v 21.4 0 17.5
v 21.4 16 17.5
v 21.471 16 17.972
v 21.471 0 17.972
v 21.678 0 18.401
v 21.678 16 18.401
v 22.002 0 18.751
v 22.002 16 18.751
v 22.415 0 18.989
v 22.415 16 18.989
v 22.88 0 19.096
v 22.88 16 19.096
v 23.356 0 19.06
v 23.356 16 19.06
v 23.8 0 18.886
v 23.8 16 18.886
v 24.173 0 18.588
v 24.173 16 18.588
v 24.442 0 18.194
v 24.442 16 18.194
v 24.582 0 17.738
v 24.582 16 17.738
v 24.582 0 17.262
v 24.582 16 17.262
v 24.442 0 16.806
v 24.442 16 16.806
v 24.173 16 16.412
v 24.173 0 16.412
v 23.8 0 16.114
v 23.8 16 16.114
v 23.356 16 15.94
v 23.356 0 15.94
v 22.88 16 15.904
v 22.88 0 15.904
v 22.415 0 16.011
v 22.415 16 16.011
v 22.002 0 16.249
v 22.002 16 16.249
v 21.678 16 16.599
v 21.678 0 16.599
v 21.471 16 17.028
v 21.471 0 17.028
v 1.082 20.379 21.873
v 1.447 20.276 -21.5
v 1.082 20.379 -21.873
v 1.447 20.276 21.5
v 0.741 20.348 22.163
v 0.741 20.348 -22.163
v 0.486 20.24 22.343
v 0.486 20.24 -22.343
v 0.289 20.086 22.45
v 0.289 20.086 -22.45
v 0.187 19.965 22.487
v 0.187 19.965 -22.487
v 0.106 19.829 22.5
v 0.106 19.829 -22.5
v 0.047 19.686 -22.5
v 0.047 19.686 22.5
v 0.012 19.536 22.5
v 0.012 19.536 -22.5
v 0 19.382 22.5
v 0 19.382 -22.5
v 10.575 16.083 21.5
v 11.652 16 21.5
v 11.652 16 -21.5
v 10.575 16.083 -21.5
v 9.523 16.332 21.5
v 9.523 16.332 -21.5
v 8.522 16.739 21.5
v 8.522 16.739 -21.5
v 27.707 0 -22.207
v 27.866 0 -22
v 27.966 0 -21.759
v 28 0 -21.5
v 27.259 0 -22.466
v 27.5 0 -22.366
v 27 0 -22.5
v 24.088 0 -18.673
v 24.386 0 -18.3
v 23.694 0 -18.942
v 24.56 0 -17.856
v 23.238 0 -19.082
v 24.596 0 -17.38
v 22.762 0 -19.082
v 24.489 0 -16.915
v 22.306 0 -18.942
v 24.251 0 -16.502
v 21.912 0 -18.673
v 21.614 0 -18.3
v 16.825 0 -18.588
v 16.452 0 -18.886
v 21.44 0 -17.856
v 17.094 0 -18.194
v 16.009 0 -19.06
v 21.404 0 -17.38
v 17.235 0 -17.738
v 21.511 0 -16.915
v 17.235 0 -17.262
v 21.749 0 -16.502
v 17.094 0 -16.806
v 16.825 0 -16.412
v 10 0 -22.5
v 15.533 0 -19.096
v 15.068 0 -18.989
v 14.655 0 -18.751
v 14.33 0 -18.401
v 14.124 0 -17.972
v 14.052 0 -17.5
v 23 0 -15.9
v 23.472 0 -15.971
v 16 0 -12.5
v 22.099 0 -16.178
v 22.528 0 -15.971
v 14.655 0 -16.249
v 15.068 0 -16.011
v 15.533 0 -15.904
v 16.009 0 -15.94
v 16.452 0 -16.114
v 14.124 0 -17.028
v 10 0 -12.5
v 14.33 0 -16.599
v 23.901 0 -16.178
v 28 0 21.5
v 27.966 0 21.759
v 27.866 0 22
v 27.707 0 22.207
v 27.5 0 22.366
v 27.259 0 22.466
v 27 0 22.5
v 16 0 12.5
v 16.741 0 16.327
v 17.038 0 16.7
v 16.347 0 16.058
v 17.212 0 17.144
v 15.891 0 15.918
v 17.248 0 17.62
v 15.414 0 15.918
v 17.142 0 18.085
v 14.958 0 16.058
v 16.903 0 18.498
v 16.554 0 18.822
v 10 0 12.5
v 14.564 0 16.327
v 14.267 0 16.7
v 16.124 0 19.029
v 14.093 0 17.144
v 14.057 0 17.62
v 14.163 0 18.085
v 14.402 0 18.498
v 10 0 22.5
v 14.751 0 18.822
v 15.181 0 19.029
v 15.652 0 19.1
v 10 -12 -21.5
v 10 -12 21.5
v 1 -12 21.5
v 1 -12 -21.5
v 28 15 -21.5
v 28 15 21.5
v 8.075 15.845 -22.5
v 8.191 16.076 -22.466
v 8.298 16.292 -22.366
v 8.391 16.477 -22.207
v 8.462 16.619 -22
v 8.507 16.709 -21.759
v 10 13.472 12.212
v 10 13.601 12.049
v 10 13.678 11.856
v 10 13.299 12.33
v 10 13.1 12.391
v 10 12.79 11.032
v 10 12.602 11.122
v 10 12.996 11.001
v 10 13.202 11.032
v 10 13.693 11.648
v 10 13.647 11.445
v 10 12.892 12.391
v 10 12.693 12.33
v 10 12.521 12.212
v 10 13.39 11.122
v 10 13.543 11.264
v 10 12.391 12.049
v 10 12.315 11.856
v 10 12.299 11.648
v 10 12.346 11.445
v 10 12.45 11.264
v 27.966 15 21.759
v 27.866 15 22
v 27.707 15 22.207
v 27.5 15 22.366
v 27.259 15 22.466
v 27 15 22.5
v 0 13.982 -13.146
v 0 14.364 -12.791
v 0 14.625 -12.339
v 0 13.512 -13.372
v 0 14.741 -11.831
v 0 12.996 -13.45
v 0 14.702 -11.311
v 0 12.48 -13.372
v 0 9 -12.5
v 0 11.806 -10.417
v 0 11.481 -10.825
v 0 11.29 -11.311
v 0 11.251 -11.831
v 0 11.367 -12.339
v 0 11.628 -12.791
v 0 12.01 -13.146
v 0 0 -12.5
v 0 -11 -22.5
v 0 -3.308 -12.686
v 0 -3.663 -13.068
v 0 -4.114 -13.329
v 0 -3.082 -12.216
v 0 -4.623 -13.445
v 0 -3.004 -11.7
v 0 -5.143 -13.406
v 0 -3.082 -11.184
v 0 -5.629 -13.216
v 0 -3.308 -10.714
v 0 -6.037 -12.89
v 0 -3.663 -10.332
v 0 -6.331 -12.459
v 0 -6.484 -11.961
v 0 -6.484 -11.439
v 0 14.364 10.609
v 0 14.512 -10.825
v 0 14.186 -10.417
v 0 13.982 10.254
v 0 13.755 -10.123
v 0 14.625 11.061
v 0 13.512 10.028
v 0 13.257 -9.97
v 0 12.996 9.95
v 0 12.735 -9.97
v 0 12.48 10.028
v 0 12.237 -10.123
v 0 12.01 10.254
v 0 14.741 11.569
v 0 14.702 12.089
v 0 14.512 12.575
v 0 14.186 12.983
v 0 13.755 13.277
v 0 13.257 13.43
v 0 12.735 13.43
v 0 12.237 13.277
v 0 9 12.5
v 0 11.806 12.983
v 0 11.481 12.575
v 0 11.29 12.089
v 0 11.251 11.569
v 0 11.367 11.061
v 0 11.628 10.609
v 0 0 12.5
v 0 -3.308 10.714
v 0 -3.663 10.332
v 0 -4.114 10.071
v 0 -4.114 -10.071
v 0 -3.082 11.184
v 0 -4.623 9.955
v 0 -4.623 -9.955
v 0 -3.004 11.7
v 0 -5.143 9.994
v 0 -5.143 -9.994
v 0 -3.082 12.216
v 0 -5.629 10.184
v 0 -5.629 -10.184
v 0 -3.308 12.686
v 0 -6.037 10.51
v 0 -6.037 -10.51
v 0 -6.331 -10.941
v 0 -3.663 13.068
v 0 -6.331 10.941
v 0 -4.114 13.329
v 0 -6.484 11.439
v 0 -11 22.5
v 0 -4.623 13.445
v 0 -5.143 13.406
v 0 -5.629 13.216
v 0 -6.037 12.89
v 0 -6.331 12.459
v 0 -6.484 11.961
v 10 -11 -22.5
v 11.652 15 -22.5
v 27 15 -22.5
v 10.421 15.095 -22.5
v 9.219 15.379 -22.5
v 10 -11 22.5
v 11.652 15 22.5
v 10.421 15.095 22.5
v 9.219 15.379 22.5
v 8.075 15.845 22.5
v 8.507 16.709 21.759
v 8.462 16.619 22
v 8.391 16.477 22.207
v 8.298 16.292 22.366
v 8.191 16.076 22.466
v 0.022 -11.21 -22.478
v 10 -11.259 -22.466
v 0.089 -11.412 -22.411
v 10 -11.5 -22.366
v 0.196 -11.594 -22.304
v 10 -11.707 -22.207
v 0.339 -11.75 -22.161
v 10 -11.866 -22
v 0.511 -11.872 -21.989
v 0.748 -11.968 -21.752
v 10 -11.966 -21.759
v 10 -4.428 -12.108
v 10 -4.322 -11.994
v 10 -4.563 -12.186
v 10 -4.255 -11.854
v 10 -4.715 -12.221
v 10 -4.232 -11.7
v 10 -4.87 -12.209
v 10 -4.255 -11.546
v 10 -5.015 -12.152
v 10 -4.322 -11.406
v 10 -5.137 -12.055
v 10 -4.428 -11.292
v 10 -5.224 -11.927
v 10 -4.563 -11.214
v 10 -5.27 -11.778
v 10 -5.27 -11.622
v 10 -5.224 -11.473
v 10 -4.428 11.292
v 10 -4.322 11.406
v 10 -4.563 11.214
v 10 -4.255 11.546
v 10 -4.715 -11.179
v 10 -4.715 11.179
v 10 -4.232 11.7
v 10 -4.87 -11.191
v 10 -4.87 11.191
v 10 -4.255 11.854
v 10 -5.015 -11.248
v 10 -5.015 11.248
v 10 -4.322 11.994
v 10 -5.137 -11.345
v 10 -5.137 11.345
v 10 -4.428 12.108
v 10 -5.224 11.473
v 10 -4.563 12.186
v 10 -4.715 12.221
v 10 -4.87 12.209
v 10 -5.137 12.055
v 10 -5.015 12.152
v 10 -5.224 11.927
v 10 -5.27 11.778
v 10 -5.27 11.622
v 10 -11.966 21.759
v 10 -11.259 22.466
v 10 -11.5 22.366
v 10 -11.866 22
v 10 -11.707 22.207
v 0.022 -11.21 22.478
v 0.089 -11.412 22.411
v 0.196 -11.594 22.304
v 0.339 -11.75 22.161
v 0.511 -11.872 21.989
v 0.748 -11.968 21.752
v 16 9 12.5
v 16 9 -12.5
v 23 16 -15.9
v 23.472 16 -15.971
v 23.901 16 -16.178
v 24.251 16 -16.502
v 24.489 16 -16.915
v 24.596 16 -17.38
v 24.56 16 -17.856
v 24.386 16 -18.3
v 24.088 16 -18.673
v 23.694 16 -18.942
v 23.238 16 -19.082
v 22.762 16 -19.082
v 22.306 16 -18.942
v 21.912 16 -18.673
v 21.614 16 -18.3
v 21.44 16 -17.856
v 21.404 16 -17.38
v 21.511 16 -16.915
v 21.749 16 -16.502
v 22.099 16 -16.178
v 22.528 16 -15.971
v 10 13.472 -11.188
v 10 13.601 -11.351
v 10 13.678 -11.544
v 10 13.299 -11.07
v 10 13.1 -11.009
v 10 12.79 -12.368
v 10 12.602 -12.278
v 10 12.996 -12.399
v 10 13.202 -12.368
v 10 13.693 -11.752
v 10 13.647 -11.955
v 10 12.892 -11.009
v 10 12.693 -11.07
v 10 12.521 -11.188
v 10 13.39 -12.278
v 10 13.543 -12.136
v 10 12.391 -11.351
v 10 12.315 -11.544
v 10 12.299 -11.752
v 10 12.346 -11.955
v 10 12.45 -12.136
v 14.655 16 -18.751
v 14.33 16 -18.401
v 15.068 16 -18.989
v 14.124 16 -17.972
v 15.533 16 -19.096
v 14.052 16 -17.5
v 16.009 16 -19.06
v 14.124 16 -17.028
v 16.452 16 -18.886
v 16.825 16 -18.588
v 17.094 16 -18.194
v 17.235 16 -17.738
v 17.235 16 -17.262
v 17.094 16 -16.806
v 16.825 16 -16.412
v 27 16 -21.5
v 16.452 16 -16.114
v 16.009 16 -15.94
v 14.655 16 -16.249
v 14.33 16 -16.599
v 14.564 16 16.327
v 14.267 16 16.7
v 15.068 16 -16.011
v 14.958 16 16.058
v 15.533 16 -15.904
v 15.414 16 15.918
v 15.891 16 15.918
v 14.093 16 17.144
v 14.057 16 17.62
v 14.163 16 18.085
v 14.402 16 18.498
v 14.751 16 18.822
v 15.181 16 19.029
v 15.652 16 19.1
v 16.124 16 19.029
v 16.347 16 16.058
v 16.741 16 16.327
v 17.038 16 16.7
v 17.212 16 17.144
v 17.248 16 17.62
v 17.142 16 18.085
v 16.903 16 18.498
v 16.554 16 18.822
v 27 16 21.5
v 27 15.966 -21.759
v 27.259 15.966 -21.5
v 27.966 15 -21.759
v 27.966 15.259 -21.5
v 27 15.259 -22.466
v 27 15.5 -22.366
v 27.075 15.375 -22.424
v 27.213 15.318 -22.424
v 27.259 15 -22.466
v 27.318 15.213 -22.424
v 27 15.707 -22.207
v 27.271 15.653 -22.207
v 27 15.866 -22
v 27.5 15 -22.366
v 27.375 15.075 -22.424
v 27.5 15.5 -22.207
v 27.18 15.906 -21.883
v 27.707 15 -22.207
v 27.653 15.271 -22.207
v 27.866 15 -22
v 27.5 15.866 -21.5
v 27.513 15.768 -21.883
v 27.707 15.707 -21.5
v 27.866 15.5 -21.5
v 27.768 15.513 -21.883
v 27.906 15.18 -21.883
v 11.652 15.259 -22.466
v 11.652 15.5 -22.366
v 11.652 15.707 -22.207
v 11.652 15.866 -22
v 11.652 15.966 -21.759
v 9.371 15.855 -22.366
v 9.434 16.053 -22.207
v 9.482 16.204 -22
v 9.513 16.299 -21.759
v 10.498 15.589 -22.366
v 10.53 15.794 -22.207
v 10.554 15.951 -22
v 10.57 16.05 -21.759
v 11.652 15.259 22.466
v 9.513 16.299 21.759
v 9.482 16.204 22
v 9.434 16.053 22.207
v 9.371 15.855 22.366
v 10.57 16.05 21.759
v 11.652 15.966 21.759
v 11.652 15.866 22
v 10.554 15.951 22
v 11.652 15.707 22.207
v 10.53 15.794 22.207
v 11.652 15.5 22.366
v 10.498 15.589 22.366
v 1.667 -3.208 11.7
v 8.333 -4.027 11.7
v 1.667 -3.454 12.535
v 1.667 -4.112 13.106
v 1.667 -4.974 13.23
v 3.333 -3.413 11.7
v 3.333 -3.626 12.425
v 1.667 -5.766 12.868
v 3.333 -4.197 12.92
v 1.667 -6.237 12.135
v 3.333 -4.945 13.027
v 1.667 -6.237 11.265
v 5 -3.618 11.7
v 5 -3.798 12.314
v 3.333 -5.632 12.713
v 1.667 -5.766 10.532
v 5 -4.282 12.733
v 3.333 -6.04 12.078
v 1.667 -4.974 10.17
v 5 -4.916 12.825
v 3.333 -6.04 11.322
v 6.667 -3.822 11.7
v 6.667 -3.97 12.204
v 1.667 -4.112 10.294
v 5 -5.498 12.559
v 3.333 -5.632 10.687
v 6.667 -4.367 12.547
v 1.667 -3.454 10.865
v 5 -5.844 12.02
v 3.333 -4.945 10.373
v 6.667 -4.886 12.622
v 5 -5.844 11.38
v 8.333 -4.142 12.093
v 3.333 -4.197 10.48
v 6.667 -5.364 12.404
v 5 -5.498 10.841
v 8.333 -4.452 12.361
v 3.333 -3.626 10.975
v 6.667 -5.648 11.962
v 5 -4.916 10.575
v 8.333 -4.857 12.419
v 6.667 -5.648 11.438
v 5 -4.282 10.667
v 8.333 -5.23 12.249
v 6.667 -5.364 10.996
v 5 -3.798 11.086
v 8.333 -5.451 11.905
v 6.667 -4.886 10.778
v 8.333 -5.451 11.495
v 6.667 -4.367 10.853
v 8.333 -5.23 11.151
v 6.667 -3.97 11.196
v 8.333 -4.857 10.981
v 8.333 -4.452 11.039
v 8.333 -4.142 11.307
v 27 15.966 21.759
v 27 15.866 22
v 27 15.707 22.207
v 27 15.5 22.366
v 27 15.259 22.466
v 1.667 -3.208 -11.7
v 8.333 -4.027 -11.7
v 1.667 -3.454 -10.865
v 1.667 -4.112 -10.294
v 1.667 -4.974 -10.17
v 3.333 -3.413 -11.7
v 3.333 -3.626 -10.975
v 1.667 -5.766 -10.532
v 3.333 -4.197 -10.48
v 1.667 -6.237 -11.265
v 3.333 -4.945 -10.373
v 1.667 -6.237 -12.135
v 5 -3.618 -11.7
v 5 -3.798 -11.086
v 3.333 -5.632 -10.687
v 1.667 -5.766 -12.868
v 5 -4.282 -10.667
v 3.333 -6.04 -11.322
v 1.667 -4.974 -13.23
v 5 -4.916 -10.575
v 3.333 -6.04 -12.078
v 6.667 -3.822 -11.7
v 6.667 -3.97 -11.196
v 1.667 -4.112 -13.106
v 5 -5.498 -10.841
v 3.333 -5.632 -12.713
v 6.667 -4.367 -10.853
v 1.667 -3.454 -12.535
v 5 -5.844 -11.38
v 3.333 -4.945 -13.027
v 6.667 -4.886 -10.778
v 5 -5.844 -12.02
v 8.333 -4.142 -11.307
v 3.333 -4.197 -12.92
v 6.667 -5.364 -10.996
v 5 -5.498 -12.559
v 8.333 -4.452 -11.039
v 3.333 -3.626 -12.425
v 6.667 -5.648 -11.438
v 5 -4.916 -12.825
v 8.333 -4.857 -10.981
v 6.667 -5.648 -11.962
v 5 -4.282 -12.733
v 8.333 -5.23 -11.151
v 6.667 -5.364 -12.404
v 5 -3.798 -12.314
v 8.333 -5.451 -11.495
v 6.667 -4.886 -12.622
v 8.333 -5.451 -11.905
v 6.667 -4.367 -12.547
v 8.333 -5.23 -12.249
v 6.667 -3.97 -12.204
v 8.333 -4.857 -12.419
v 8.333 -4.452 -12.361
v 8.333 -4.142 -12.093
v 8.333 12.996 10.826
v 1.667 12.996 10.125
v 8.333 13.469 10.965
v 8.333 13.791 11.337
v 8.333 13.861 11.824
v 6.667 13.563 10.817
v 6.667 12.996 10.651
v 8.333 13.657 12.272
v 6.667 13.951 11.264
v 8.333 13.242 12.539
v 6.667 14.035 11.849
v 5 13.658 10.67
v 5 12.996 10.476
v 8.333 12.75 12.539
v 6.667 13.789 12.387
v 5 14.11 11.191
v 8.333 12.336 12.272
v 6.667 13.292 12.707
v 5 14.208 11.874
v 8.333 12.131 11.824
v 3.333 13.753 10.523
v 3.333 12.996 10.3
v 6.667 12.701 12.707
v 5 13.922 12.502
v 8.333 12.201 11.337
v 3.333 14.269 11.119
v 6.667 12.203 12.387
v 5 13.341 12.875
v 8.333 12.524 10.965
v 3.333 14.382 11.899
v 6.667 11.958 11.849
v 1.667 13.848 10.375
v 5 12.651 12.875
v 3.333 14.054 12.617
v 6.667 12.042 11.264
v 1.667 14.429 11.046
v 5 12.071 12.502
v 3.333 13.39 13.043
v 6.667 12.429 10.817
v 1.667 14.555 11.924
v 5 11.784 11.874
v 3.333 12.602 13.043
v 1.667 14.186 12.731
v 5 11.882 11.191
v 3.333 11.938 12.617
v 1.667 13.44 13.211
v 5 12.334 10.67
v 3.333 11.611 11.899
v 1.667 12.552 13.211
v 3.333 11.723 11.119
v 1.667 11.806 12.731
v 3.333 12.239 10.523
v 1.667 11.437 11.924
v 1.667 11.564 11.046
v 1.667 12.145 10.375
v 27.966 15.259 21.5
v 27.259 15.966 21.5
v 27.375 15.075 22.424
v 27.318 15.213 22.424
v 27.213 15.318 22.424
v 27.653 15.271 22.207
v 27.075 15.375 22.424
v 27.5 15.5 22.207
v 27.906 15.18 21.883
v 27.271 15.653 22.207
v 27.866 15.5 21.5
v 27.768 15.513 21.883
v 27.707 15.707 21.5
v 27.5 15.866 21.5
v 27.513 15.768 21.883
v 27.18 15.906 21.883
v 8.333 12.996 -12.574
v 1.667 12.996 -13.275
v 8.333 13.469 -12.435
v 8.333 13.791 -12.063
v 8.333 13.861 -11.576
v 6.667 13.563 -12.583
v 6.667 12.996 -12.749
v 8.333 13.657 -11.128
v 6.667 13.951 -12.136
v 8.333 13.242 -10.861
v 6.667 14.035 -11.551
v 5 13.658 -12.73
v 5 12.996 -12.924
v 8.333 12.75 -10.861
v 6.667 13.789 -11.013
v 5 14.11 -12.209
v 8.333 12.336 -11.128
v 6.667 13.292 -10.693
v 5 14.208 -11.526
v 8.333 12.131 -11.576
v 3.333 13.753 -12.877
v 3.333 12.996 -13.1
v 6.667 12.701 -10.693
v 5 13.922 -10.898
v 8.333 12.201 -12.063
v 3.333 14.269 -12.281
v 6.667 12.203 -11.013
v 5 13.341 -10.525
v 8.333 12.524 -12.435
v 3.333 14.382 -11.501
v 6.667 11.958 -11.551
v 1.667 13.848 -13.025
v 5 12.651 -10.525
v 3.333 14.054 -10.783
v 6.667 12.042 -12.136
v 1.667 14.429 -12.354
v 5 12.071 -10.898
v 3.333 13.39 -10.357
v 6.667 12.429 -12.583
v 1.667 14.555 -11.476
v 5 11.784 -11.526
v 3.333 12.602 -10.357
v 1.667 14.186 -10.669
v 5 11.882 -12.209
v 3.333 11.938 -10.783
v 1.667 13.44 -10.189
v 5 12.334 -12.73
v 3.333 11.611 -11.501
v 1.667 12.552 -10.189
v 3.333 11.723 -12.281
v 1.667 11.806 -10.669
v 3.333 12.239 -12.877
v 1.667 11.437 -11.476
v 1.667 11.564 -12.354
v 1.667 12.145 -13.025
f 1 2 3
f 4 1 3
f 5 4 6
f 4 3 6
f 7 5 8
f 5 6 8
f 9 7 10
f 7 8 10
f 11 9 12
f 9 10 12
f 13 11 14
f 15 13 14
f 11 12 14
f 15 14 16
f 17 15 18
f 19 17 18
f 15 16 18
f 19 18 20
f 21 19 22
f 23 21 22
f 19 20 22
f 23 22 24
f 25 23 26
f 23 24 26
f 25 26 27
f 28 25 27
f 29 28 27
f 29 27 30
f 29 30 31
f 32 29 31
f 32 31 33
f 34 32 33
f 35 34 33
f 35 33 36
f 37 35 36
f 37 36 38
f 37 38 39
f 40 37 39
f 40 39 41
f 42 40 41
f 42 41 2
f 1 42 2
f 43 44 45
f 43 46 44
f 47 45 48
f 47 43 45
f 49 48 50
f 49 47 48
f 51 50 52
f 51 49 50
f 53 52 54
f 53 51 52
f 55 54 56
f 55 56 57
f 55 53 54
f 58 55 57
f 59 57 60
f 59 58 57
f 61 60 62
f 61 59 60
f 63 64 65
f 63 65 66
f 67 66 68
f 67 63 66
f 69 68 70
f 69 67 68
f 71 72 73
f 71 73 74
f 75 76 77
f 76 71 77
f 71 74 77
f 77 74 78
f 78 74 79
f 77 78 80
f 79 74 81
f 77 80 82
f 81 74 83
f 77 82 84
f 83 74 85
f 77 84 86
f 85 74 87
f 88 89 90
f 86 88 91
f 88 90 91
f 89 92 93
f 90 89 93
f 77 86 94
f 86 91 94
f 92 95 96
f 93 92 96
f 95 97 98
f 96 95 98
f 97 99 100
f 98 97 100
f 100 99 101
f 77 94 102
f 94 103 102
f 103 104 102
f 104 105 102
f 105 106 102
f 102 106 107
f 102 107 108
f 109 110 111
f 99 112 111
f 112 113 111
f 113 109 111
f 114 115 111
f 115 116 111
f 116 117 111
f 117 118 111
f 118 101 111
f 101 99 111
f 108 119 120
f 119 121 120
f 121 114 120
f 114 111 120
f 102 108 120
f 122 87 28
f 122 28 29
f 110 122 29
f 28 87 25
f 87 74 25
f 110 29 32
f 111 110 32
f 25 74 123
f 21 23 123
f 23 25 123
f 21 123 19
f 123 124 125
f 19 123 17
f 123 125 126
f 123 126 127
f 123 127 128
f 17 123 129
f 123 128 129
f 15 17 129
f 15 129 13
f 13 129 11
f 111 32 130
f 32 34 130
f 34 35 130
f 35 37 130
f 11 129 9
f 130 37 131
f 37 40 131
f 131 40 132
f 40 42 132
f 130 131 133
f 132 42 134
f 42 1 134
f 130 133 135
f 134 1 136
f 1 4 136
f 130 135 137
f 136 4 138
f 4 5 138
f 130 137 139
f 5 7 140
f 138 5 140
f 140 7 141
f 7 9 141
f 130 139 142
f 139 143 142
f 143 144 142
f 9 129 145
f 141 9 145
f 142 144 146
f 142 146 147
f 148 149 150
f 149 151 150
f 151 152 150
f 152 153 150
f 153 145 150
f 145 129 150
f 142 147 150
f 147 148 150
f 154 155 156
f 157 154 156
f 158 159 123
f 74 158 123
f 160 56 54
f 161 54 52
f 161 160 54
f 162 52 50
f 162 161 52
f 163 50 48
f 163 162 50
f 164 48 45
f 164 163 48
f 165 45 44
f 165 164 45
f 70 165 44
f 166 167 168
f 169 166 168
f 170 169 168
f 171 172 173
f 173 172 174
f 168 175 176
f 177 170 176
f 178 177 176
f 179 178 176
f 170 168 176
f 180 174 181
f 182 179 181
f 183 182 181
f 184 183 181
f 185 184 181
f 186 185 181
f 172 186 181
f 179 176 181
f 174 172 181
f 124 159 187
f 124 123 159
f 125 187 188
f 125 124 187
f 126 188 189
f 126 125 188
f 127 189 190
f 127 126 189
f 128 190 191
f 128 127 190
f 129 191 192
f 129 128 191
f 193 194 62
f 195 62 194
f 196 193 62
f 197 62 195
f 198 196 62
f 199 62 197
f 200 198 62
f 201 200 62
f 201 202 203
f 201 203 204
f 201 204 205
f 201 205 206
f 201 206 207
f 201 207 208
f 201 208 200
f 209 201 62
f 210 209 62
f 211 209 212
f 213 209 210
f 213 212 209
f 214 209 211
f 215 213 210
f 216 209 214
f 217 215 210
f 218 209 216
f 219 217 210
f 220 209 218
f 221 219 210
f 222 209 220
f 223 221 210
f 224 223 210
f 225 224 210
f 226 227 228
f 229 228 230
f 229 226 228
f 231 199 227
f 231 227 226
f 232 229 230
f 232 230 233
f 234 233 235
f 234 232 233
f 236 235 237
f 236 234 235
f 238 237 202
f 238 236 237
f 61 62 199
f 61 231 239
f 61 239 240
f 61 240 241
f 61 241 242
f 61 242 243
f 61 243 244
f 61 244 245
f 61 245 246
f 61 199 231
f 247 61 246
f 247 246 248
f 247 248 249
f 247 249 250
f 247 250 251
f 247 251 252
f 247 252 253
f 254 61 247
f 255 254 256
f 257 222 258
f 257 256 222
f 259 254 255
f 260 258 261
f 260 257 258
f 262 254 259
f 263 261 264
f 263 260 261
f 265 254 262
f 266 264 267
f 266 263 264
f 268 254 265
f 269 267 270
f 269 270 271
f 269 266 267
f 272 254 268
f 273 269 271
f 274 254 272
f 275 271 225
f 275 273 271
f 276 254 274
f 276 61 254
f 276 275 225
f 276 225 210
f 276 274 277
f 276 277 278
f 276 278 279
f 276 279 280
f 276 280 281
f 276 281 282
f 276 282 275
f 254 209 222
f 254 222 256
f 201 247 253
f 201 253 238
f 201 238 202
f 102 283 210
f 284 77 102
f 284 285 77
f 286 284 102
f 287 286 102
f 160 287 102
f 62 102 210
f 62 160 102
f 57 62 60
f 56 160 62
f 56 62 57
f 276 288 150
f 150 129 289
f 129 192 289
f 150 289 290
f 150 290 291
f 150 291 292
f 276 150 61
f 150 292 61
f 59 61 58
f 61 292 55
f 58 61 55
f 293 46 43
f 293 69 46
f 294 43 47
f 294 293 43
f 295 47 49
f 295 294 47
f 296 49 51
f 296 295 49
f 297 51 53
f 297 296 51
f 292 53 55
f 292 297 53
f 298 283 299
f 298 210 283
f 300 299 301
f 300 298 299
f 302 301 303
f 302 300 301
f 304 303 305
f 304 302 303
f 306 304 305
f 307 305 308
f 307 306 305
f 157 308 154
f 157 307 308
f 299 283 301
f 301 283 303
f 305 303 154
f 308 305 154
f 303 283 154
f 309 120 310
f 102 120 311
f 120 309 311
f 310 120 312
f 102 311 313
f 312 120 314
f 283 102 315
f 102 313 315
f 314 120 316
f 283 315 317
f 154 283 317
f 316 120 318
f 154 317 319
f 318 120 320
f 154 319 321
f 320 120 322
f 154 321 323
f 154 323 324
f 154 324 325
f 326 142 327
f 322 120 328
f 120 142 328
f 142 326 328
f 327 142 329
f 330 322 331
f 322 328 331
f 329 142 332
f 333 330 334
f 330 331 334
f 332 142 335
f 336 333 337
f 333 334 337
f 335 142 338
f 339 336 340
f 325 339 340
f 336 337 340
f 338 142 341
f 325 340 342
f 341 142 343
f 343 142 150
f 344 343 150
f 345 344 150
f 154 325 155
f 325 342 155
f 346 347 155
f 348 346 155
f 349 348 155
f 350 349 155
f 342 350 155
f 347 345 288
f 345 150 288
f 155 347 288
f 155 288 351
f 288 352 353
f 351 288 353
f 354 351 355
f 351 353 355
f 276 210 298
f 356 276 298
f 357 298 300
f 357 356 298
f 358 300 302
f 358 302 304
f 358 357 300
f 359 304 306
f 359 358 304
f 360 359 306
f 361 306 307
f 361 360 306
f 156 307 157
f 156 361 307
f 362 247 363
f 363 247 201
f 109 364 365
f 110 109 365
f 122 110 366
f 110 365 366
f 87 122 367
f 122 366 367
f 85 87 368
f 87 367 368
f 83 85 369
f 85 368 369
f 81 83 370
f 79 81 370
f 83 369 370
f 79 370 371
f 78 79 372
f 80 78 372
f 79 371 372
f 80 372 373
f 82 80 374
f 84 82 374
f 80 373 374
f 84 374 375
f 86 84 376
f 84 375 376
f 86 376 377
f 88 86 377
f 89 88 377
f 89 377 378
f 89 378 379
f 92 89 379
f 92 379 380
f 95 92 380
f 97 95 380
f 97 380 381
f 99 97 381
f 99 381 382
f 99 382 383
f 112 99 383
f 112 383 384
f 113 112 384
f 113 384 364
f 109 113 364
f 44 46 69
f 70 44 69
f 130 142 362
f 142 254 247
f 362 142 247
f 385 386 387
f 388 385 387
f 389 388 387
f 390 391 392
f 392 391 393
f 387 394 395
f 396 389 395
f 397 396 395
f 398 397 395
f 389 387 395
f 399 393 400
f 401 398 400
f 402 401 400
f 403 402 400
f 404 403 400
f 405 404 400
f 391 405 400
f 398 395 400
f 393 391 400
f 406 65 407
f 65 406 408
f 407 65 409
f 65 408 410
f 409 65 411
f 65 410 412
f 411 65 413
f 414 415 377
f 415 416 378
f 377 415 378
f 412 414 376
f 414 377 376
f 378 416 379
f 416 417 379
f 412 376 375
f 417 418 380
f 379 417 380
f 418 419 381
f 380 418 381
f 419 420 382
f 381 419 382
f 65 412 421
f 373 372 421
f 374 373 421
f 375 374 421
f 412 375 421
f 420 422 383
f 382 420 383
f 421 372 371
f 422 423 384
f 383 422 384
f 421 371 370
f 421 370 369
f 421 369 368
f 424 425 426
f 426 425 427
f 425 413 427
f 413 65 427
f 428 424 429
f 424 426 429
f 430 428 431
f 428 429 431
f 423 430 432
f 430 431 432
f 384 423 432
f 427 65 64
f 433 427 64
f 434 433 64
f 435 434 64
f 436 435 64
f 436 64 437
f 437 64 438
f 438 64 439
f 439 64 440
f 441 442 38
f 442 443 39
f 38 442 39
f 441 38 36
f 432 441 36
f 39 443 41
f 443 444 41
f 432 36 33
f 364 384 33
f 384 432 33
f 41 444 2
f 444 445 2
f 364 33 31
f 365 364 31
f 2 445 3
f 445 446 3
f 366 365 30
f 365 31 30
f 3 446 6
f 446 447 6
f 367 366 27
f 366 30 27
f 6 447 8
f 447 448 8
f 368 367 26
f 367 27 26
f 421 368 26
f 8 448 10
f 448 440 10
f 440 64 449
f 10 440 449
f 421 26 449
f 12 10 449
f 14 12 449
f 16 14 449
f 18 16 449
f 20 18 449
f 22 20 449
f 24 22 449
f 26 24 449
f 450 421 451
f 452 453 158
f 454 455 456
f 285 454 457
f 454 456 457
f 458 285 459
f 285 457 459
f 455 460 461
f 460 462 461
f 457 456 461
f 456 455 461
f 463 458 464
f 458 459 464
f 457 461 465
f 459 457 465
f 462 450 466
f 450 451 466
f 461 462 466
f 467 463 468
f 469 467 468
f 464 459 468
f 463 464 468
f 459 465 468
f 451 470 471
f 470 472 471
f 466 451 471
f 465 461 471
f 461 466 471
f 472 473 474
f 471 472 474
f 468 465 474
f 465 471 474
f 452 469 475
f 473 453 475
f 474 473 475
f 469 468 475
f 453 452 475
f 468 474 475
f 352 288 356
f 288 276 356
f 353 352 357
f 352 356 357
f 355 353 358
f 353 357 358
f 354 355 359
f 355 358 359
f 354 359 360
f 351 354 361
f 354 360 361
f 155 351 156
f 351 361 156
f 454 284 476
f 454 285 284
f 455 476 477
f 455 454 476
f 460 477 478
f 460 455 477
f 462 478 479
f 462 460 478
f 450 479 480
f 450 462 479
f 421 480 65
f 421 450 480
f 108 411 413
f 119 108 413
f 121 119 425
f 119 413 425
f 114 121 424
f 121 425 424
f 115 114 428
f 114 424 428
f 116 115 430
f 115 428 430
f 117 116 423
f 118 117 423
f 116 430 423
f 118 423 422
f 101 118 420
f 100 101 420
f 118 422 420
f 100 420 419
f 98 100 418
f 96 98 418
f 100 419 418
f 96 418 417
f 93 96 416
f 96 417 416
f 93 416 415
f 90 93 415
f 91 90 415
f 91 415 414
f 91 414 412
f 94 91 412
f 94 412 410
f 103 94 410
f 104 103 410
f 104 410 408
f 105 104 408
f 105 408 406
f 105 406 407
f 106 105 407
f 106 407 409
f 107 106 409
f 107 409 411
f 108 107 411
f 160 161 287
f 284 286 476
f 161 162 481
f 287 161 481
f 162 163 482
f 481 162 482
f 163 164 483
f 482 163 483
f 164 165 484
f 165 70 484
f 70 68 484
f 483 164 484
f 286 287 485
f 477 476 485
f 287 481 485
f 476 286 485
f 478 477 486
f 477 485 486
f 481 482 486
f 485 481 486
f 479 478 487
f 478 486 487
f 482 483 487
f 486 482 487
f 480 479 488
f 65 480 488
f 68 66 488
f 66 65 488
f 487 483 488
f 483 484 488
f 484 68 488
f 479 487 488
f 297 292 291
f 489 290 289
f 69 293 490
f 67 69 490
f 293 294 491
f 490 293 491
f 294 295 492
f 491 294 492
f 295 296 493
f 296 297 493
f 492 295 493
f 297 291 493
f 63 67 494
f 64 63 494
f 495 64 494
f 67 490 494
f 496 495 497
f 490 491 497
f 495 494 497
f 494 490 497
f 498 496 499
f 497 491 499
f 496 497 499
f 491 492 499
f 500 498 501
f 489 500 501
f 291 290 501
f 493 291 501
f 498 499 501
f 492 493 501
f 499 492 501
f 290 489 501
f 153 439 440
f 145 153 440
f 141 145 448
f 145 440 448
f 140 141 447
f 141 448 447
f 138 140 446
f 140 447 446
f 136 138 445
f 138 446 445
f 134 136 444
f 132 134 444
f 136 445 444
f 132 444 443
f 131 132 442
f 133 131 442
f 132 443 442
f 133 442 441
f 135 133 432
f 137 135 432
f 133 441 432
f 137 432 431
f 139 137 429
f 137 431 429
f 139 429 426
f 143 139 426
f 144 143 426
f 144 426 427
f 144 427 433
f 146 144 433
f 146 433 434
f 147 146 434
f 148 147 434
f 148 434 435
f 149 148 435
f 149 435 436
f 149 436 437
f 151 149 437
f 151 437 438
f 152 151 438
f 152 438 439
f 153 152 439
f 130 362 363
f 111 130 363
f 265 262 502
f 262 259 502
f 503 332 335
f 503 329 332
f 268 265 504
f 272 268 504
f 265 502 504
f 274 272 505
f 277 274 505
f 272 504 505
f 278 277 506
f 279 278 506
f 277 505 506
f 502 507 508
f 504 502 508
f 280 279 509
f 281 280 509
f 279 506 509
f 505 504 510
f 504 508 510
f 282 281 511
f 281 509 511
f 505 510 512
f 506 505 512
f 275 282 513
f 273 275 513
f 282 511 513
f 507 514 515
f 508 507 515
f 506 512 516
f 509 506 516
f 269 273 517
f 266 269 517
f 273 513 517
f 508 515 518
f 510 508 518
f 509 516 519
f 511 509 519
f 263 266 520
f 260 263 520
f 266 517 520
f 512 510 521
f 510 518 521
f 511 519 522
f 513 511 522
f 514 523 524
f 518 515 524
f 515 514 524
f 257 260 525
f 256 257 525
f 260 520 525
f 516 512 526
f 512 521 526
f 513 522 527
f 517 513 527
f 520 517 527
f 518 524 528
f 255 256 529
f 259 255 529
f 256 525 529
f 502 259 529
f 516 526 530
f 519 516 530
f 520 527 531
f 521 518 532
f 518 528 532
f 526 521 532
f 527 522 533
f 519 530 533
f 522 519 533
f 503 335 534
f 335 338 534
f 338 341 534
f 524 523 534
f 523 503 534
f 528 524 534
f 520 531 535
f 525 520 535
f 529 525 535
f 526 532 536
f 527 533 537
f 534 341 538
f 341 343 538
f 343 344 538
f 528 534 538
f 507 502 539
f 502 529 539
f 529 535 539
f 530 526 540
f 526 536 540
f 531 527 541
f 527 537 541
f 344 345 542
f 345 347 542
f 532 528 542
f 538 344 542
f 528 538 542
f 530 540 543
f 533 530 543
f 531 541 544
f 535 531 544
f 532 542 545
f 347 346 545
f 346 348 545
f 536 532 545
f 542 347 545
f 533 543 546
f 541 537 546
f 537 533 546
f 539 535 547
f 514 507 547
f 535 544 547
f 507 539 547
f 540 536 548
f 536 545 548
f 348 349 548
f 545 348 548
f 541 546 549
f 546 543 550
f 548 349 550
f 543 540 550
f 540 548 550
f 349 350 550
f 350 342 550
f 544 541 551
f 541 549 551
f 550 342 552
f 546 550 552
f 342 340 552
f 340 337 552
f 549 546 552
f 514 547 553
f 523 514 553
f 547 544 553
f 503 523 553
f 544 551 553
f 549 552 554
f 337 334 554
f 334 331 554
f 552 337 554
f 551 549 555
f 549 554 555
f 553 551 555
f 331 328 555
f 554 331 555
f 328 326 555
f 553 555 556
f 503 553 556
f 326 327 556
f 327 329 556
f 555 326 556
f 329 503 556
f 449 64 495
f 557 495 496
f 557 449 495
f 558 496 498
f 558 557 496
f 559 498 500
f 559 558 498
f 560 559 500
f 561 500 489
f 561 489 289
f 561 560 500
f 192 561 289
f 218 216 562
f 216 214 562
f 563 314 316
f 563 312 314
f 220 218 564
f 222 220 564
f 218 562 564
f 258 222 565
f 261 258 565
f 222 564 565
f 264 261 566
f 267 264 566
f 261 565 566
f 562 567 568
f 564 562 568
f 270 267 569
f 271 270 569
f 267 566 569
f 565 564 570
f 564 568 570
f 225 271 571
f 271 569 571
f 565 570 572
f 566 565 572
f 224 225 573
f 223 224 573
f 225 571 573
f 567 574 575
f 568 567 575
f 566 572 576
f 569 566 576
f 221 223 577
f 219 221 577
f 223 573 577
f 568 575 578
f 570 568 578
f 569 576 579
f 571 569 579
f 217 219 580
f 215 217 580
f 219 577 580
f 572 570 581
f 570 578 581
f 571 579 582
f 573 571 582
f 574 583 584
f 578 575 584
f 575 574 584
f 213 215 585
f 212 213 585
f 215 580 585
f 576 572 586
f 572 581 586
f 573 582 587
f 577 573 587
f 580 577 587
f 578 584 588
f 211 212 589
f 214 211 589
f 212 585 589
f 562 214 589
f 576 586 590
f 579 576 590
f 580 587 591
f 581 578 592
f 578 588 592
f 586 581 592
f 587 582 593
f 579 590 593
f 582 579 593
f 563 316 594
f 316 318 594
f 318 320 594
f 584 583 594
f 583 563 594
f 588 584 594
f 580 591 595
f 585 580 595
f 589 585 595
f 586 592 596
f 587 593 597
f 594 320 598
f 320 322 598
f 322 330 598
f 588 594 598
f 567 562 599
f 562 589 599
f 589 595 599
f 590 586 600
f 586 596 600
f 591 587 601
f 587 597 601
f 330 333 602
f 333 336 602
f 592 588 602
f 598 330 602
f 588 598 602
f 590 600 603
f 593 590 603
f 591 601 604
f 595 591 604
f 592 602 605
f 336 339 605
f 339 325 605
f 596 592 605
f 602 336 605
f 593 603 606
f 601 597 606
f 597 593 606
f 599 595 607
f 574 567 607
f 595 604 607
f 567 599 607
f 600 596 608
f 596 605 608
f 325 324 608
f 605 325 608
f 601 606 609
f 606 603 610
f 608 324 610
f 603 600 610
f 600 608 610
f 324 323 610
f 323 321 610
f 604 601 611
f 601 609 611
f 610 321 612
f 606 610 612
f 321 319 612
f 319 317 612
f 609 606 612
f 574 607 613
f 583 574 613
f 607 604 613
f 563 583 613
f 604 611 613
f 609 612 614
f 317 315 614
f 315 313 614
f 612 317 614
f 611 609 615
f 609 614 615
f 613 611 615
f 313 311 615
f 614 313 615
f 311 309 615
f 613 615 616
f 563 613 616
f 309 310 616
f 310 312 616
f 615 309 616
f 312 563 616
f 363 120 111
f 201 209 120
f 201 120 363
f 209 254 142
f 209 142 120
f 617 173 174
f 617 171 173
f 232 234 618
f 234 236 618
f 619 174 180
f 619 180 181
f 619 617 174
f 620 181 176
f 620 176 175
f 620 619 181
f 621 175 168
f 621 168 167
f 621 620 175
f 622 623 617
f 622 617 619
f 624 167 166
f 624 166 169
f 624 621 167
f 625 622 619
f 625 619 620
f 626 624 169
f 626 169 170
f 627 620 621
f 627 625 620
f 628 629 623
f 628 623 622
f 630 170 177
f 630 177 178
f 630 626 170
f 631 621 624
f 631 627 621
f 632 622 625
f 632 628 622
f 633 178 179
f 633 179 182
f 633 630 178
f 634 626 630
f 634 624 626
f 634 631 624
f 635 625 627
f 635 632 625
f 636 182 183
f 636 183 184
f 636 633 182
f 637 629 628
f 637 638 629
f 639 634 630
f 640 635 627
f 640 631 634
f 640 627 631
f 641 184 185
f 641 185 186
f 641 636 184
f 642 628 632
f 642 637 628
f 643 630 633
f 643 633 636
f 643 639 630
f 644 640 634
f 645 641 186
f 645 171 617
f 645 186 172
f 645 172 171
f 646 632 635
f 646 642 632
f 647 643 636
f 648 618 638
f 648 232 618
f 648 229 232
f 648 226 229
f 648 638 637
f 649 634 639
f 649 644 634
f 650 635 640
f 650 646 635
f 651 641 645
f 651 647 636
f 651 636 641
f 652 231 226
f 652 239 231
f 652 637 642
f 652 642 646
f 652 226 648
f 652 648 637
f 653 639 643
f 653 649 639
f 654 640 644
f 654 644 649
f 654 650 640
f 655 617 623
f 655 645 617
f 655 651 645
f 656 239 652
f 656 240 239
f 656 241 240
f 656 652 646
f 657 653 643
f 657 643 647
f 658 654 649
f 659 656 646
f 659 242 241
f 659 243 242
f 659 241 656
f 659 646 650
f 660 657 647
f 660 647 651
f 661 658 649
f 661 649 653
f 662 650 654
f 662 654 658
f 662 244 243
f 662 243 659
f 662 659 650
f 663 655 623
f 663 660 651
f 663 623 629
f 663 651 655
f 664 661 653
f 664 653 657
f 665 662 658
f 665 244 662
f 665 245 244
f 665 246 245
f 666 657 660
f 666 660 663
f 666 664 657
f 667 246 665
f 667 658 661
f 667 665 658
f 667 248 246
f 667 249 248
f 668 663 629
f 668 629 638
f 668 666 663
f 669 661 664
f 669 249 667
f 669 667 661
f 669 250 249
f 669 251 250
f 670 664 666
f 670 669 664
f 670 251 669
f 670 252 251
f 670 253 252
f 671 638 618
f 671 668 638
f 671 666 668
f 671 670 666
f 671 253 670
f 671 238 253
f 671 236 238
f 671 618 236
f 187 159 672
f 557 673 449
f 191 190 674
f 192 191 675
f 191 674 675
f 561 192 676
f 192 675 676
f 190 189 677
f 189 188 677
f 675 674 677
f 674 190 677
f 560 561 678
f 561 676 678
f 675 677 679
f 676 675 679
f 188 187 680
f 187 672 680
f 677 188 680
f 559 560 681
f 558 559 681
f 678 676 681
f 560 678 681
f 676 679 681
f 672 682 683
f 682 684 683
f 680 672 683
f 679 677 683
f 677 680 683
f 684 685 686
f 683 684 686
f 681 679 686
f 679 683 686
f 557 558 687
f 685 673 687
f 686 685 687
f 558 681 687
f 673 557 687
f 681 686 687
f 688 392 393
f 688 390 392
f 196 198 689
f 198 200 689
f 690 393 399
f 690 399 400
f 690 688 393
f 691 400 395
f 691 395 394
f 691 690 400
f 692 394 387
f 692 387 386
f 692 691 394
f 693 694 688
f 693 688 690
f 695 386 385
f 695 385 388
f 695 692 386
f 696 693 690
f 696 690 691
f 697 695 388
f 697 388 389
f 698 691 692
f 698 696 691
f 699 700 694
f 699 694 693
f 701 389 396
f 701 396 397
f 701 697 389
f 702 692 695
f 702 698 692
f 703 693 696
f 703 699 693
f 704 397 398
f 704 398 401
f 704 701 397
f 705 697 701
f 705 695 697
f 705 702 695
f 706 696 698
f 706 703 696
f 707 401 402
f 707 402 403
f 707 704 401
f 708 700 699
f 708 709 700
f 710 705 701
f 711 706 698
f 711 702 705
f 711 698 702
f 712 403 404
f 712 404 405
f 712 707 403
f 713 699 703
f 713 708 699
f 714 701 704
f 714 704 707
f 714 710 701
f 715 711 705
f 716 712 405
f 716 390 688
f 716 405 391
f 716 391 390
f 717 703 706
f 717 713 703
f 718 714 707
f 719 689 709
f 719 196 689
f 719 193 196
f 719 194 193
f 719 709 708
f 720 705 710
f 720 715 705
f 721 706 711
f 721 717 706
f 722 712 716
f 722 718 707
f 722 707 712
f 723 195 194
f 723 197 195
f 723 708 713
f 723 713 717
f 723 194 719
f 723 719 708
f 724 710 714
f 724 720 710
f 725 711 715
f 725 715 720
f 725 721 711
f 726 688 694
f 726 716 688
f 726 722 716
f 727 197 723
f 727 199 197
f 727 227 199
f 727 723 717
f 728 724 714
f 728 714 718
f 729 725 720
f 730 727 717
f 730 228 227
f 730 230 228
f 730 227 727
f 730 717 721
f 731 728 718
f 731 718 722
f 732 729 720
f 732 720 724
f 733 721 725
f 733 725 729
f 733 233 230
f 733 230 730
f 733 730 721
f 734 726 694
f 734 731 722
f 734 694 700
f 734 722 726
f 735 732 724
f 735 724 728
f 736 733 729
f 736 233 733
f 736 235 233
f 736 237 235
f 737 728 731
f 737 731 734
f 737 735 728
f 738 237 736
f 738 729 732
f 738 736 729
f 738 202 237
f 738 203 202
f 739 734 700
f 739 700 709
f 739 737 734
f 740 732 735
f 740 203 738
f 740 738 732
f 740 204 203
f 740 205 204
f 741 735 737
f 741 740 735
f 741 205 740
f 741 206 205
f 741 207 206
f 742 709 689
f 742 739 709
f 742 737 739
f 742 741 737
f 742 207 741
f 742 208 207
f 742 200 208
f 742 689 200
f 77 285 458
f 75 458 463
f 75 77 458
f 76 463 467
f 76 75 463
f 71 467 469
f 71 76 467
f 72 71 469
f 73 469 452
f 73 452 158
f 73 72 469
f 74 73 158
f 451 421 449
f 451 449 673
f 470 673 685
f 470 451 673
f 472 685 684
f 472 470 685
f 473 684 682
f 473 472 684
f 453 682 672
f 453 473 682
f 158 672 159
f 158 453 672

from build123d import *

# Parameters (mm, degrees)
BOSS_EXTRUDE1_DEPTH          = 22.5
CUT_EXTRUDE1_START           = -28
SKETCH12_W                   = 25
SKETCH12_H                   = 9
CUT_EXTRUDE1_DEPTH           = 16
CUT_EXTRUDE2_START           = -28
SKETCH13_R                   = 1.75
CUT_EXTRUDE2_DEPTH           = 10
CUT_EXTRUDE2_DRAFT           = 6
CUT_EXTRUDE2_PROFILE_2_DEPTH = 10
CUT_EXTRUDE2_PROFILE_2_DRAFT = 6
FILLET1_R                    = 7
FILLET2_R                    = 1
SKETCH17_R                   = 1.6
CUT_EXTRUDE5_DEPTH           = 46.543934832


# Read off the part's stored shape, not the designer's step: Cut-Extrude3
with BuildPart() as part:
    # Sketch1 → Boss-Extrude1 (new, symmetric)
    with BuildSketch(Plane.XY):
        Polygon((10, 16), (28, 16), (28, 0), (10, 0), (10, -12), (0, -12), (0, 0), (0, 21), align=None)
    extrude(amount=BOSS_EXTRUDE1_DEPTH, both=True)

    # Sketch12 → Cut-Extrude1 (cut)
    with BuildSketch(Plane(origin=(28, 0, 0), x_dir=(0, 0, -1), z_dir=(1, 0, 0)).offset(CUT_EXTRUDE1_START)):
        with Locations((0, 4.5)):
            Rectangle(SKETCH12_W, SKETCH12_H)
    extrude(amount=CUT_EXTRUDE1_DEPTH, mode=Mode.SUBTRACT)


with BuildPart() as cut_extrude2_tool:
    # Sketch13 → Cut-Extrude2 (with draft: the straight prism first)
    with BuildSketch(Plane(origin=(28, 0, 0), x_dir=(0, 0, -1), z_dir=(1, 0, 0)).offset(CUT_EXTRUDE2_START)):
        with Locations((11.7, 12.996154984)):
            Circle(SKETCH13_R)
    extrude(amount=CUT_EXTRUDE2_DEPTH)
    # Cut-Extrude2: the draft: its side faces are tilted about the plane it starts from
    cut_extrude2_sides = [cut_extrude2_tool.faces().sort_by_distance(p)[0] for p in [
        (5, 12.996154984, -9.95),
    ]]
    draft(cut_extrude2_sides, Plane(origin=(28, 0, 0), x_dir=(0, 0, -1), z_dir=(1, 0, 0)).offset(CUT_EXTRUDE2_START), CUT_EXTRUDE2_DRAFT)


with BuildPart() as part_1:
    add(part.part)

    # Cut-Extrude2: cut by cut_extrude2_tool
    add(cut_extrude2_tool.part, mode=Mode.SUBTRACT)


with BuildPart() as cut_extrude2_profile_2_tool:
    # Sketch13 → Cut-Extrude2 profile 2 (with draft: the straight prism first)
    with BuildSketch(Plane(origin=(28, 0, 0), x_dir=(0, 0, -1), z_dir=(1, 0, 0)).offset(CUT_EXTRUDE2_START)):
        with Locations((-11.7, 12.996154984)):
            Circle(SKETCH13_R)
    extrude(amount=CUT_EXTRUDE2_PROFILE_2_DEPTH)
    # Cut-Extrude2 profile 2: the draft: its side faces are tilted about the plane it starts from
    cut_extrude2_profile_2_sides = [cut_extrude2_profile_2_tool.faces().sort_by_distance(p)[0] for p in [
        (5, 12.996154984, 13.45),
    ]]
    draft(cut_extrude2_profile_2_sides, Plane(origin=(28, 0, 0), x_dir=(0, 0, -1), z_dir=(1, 0, 0)).offset(CUT_EXTRUDE2_START), CUT_EXTRUDE2_PROFILE_2_DRAFT)


with BuildPart() as part_2:
    add(part_1.part)

    # Cut-Extrude2 profile 2: cut by cut_extrude2_profile_2_tool
    add(cut_extrude2_profile_2_tool.part, mode=Mode.SUBTRACT)

    # Cut-Extrude3 outline → Cut-Extrude3 (revolve, cut)
    with BuildSketch(Plane(origin=(0, -4.753845016, 11.7), x_dir=(0, 1, 0), z_dir=(0, 0, -1))):
        Polygon((0, 0), (1.75, 0), (0.522154391, 10), (0, 10), align=None)
    revolve(axis=Axis((0, -4.753845016, 11.7), (1, 0, 0)), mode=Mode.SUBTRACT)

    # Cut-Extrude3 2 outline → Cut-Extrude3 2 (revolve, cut)
    with BuildSketch(Plane(origin=(0, -4.753845016, -11.7), x_dir=(0, 1, 0), z_dir=(0, 0, -1))):
        Polygon((0, 0), (1.75, 0), (0.522154391, 10), (0, 10), align=None)
    revolve(axis=Axis((0, -4.753845016, -11.7), (1, 0, 0)), mode=Mode.SUBTRACT)

    # Fillet1
    fillet1_edges = [part_2.edges().sort_by_distance(p)[0] for p in [
        (10, 16, 0),
    ]]
    fillet(fillet1_edges, radius=FILLET1_R)

    # Fillet2
    fillet2_edges = [part_2.edges().sort_by_distance(p)[0] for p in [
        (5, -12, -22.5),
        (28, 16, 0),
        (0, -12, 0),
        (0, 21, 0),
        (5, -12, 22.5),
        (28, 8, 22.5),
        (19.826237921, 16, 22.5),
        (4.260990337, 18.869504832, -22.5),
        (4.260990337, 18.869504832, 22.5),
        (10.044205399, 16.187257074, -22.5),
        (10.044205399, 16.187257074, 22.5),
        (19.826237921, 16, -22.5),
        (28, 8, -22.5),
    ]]
    fillet(fillet2_edges, radius=FILLET2_R)

    # Sketch17 → Cut-Extrude5 (cut, through all)
    with BuildSketch(Plane(origin=(0, 16, 0), x_dir=(1, 0, 0), z_dir=(0, 1, 0))):
        with Locations(Location((23, 17.5, 0), (0, 0, 270))):
            Circle(SKETCH17_R)
        with Locations(Location((15.652475842, 17.5, 0), (0, 0, 180))):
            Circle(SKETCH17_R)
        with Locations(Location((15.652475842, -17.5, 0), (0, 0, 270))):
            Circle(SKETCH17_R)
        with Locations(Location((23, -17.5, 0), (0, 0, 180))):
            Circle(SKETCH17_R)
    extrude(amount=-CUT_EXTRUDE5_DEPTH, mode=Mode.SUBTRACT)


solid = part_2.part
